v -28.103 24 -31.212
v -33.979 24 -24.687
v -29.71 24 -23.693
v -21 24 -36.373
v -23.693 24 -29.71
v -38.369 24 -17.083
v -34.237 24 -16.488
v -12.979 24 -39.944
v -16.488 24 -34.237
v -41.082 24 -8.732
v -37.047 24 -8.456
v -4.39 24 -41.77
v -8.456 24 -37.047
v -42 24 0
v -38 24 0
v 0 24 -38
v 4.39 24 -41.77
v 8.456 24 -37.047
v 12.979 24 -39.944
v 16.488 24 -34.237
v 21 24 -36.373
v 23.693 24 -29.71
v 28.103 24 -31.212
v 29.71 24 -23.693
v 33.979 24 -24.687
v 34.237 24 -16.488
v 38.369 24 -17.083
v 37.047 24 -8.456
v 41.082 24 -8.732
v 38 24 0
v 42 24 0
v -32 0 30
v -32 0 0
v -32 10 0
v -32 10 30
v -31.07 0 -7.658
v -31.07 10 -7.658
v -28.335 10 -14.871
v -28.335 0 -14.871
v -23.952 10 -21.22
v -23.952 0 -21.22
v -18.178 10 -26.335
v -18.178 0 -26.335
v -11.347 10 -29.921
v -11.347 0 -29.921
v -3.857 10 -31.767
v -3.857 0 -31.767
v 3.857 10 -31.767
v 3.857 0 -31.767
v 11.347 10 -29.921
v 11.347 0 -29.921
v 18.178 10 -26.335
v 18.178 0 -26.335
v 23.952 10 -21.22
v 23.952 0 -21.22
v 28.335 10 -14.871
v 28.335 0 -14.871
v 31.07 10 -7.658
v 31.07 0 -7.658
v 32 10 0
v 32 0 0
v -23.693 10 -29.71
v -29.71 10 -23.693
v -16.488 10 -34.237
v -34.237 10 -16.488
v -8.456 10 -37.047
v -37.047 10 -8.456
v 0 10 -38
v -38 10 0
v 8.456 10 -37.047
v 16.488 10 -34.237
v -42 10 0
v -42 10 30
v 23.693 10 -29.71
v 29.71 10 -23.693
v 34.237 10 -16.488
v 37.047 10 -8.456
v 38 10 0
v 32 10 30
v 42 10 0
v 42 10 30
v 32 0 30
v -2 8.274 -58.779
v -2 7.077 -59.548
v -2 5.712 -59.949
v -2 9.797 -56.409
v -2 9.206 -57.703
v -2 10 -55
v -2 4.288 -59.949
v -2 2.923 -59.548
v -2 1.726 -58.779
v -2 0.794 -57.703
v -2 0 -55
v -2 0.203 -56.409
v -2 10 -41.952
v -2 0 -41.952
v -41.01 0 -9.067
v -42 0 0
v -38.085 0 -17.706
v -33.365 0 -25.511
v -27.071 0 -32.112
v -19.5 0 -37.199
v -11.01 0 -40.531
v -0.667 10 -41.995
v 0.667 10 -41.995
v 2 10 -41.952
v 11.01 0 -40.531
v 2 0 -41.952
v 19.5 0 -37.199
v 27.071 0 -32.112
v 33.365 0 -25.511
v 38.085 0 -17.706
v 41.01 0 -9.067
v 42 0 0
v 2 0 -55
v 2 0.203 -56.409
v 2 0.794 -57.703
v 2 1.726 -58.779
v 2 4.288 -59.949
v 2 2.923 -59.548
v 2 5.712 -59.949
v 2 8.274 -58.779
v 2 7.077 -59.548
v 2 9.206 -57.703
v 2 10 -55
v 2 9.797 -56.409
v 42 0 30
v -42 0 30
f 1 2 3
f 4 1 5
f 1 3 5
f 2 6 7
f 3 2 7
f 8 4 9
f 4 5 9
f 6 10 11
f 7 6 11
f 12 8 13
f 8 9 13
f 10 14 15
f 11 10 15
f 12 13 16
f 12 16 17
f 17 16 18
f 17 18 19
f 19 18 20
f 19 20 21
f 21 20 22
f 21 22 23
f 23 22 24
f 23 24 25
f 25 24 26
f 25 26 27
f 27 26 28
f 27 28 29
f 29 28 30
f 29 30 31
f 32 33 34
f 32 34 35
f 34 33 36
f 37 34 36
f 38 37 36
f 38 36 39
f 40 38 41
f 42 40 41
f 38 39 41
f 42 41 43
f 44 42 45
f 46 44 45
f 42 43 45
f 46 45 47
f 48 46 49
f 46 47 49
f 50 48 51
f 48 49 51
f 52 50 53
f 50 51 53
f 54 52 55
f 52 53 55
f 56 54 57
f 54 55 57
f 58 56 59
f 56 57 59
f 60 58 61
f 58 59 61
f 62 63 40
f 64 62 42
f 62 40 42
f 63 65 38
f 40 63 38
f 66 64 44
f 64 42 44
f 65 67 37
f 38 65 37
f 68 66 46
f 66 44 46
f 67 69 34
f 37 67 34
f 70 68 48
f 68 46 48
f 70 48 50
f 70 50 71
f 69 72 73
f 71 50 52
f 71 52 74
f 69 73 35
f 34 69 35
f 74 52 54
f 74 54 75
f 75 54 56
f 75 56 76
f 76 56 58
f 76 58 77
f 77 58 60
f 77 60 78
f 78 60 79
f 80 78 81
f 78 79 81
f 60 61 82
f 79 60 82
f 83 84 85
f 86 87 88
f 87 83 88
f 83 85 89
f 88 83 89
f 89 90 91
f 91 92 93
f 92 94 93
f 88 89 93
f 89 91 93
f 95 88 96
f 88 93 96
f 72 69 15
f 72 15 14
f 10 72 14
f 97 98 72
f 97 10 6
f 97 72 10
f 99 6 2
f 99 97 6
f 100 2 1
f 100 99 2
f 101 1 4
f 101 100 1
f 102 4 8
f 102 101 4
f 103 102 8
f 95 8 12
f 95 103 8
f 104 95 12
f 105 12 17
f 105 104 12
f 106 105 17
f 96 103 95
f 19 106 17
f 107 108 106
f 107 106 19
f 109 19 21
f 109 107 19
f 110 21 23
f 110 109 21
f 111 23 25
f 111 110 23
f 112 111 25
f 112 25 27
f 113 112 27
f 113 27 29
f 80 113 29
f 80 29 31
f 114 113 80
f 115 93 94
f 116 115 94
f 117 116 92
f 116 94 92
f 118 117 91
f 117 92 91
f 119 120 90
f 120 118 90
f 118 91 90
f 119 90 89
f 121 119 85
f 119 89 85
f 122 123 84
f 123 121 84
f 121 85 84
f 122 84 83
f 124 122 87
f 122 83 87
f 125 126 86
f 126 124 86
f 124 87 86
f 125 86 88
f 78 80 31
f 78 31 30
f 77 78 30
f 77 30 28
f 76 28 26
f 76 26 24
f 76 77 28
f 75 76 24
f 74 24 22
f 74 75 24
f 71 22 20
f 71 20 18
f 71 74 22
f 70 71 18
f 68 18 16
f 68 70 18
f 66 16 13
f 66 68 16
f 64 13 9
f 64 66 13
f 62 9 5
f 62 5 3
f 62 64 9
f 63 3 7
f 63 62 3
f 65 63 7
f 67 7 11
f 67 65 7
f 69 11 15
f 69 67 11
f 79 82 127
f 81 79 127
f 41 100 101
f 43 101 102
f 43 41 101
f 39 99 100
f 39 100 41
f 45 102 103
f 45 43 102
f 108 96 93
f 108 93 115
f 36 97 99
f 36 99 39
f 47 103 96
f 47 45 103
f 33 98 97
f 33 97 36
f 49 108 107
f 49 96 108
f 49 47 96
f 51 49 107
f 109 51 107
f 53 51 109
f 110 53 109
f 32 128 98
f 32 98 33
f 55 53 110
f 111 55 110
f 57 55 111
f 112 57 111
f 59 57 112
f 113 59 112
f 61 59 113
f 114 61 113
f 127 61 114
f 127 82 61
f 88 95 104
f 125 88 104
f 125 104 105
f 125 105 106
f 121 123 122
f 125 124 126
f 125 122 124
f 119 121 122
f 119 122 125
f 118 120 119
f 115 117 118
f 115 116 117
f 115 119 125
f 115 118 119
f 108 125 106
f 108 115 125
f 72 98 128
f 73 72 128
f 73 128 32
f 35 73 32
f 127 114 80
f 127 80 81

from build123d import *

# Parameters (mm, degrees)
EXTRUDE_1_DEPTH     = 10
EXTRUDE_2_DEPTH     = 24
SKETCH_3_W          = 4
SKETCH_3_H          = 24
SKETCH_3_W_2        = 10
SKETCH_3_H_2        = 30
EXTRUDE_3_DEPTH     = 10
CUT_EXTRUDE_1_DEPTH = 10


with BuildPart() as part:
    # 草图1 → 凸台-拉伸1 (new body)
    with BuildSketch(Plane(origin=(0, 0, 0), x_dir=(1, 0, 0), z_dir=(0, 1, 0))):
        with BuildLine():
            Line((-38, 0), (-32, 0))
            ThreePointArc((-32, 0), (0, 32), (32, 0))
            Line((32, 0), (38, 0))
            ThreePointArc((38, 0), (0, 38), (-38, 0))
        make_face()
    extrude(amount=EXTRUDE_1_DEPTH)

    # 草图2 → 凸台-拉伸2 (add)
    with BuildSketch(Plane.XZ):
        with BuildLine():
            Line((-38, 0), (-42, 0))
            ThreePointArc((-42, 0), (0, -42), (42, 0))
            Line((42, 0), (38, 0))
            ThreePointArc((38, 0), (0, -38), (-38, 0))
        make_face()
    extrude(amount=-EXTRUDE_2_DEPTH)

    # 草图3 → 凸台-拉伸3 (add)
    with BuildSketch(Plane.XZ):
        with Locations((0, -48)):
            Rectangle(SKETCH_3_W, SKETCH_3_H)
        with Locations((-37, 15)):
            Rectangle(SKETCH_3_W_2, SKETCH_3_H_2)
        with Locations((37, 15)):
            Rectangle(SKETCH_3_W_2, SKETCH_3_H_2)
    extrude(amount=-EXTRUDE_3_DEPTH)

    # 草图4 → 切除-拉伸1 (cut)
    with BuildSketch(Plane.ZY.offset(2)):
        with BuildLine():
            Line((-55, 10), (-63.230439801, 10))
            Line((-63.230439801, 10), (-63.230439801, 0))
            Line((-63.230439801, 0), (-55, 0))
            ThreePointArc((-55, 0), (-60, 5), (-55, 10))
        make_face()
    extrude(amount=-CUT_EXTRUDE_1_DEPTH, mode=Mode.SUBTRACT)


solid = part.part
